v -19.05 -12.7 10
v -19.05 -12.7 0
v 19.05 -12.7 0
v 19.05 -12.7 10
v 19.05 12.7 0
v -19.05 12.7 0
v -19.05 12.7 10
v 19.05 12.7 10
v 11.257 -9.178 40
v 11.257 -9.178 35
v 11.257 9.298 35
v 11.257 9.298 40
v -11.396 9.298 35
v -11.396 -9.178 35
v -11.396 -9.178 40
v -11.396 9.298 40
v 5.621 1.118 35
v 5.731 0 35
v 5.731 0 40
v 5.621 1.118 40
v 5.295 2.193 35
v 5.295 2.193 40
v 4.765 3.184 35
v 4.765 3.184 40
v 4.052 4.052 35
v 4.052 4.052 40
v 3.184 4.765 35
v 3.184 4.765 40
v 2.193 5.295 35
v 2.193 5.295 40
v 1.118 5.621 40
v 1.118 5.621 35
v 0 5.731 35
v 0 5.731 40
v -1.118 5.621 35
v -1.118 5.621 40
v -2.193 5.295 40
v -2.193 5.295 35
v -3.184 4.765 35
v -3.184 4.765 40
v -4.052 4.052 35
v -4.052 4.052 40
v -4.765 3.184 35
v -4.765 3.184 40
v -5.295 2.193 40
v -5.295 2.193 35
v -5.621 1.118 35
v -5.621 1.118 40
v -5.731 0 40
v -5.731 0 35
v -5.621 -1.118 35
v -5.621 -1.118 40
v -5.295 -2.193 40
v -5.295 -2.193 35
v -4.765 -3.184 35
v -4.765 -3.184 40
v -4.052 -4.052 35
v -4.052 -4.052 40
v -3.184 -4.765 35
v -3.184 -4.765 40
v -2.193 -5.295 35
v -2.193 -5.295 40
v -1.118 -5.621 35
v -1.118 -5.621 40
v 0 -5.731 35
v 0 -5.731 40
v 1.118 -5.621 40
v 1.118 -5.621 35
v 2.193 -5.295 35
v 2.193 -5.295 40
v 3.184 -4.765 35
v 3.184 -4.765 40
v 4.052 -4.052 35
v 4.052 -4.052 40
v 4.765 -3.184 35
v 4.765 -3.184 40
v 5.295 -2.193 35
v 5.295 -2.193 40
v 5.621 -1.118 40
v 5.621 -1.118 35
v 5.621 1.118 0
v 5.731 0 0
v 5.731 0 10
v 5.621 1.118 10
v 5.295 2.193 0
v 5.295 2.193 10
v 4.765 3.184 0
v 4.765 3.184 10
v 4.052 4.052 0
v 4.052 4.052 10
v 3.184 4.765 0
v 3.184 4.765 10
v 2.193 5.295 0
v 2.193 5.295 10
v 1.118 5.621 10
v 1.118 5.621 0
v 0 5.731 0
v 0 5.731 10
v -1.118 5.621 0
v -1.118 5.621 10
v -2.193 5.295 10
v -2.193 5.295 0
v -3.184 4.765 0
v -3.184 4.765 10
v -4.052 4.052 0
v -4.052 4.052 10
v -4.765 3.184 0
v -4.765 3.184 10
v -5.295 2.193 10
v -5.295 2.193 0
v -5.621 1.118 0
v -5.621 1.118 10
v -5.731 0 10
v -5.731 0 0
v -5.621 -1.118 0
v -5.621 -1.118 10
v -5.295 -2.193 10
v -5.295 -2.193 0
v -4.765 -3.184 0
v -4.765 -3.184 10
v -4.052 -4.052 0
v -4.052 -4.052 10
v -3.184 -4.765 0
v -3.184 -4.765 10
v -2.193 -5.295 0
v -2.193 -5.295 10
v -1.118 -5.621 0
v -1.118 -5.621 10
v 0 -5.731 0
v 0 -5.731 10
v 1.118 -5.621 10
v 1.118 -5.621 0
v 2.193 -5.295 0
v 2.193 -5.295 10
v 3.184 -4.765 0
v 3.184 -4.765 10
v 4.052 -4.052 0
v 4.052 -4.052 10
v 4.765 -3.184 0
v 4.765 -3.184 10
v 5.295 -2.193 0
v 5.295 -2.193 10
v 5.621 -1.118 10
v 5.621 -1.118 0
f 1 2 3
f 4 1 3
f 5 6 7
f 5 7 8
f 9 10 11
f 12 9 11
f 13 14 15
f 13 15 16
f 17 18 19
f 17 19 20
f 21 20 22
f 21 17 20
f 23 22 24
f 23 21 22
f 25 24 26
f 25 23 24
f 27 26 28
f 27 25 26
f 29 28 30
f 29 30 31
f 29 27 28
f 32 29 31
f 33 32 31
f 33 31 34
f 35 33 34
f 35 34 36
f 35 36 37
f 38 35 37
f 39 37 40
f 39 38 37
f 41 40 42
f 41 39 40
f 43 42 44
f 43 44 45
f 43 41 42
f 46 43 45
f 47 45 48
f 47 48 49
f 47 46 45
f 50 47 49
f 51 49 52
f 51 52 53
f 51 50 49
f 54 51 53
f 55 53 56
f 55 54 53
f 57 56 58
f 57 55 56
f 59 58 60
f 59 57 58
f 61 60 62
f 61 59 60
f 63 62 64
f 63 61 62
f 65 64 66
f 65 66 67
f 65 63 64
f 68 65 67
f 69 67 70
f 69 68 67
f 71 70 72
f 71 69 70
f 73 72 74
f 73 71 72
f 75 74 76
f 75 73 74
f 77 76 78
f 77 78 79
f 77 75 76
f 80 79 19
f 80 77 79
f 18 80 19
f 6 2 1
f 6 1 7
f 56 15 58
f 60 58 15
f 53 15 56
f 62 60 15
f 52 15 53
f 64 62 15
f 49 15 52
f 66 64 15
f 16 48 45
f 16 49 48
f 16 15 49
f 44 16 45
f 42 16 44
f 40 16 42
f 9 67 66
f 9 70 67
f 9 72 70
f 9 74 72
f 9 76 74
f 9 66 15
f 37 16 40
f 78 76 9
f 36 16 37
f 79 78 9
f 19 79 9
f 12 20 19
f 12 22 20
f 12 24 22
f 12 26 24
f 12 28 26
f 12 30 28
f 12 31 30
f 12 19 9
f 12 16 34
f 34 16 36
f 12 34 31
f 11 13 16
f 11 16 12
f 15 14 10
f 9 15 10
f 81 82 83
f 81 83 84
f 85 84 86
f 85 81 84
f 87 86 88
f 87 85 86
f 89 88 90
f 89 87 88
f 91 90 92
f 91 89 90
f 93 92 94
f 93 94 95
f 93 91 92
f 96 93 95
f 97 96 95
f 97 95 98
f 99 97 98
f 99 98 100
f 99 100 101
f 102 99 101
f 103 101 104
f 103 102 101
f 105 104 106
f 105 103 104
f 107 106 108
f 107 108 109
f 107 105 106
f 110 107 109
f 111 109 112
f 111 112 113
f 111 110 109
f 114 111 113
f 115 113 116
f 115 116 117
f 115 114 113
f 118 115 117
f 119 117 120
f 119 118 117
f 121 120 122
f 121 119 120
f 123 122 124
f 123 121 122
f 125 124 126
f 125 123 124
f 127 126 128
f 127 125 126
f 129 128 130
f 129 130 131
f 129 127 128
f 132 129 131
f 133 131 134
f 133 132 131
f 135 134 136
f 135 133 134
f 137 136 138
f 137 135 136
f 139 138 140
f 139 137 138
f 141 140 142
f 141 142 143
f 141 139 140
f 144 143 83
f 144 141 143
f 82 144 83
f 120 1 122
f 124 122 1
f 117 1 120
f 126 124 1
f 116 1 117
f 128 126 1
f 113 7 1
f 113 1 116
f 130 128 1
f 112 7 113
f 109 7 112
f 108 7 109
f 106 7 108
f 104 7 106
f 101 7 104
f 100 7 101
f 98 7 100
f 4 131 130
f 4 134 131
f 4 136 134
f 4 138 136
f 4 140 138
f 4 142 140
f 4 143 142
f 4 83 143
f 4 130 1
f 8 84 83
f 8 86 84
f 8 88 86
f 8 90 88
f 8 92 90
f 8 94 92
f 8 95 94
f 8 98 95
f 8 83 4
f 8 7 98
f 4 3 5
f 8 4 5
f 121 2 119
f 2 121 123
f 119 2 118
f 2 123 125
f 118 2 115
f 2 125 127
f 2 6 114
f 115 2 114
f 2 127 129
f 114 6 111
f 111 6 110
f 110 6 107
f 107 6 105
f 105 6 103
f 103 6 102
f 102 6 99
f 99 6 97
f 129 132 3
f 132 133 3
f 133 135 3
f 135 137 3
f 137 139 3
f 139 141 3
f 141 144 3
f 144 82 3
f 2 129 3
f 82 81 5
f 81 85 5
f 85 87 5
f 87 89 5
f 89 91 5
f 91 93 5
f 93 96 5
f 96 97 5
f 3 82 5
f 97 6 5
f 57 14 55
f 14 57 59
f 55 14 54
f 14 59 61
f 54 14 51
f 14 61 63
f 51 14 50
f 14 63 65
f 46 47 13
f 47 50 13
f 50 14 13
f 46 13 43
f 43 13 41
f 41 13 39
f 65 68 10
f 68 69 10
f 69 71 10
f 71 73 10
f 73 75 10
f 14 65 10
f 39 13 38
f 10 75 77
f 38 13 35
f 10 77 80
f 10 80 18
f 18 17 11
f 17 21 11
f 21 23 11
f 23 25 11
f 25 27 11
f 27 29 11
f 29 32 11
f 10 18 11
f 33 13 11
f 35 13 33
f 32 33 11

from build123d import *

# Parameters (mm, degrees)
F0_W     = 38.1
F0_H     = 25.4
F0_R     = 5.731056
F1_DEPTH = 10
F4_W     = 22.653234
F4_H     = 18.476042
F4_R     = 5.731056
F5_DEPTH = 5


with BuildPart() as f1:
    # F0 (on Top) → F1 (new body)
    with BuildSketch(Plane.XY):
        Rectangle(F0_W, F0_H)
        Circle(F0_R, mode=Mode.SUBTRACT)
    extrude(amount=F1_DEPTH)


with BuildPart() as f5:
    # F4 (on offset) → F5 (new body)
    with BuildSketch(Plane.XY.offset(35)):
        with Locations((-0.069145, 0.060248)):
            Rectangle(F4_W, F4_H)
        Circle(F4_R, mode=Mode.SUBTRACT)
    extrude(amount=F5_DEPTH)


solid = Compound([f1.part, f5.part])
